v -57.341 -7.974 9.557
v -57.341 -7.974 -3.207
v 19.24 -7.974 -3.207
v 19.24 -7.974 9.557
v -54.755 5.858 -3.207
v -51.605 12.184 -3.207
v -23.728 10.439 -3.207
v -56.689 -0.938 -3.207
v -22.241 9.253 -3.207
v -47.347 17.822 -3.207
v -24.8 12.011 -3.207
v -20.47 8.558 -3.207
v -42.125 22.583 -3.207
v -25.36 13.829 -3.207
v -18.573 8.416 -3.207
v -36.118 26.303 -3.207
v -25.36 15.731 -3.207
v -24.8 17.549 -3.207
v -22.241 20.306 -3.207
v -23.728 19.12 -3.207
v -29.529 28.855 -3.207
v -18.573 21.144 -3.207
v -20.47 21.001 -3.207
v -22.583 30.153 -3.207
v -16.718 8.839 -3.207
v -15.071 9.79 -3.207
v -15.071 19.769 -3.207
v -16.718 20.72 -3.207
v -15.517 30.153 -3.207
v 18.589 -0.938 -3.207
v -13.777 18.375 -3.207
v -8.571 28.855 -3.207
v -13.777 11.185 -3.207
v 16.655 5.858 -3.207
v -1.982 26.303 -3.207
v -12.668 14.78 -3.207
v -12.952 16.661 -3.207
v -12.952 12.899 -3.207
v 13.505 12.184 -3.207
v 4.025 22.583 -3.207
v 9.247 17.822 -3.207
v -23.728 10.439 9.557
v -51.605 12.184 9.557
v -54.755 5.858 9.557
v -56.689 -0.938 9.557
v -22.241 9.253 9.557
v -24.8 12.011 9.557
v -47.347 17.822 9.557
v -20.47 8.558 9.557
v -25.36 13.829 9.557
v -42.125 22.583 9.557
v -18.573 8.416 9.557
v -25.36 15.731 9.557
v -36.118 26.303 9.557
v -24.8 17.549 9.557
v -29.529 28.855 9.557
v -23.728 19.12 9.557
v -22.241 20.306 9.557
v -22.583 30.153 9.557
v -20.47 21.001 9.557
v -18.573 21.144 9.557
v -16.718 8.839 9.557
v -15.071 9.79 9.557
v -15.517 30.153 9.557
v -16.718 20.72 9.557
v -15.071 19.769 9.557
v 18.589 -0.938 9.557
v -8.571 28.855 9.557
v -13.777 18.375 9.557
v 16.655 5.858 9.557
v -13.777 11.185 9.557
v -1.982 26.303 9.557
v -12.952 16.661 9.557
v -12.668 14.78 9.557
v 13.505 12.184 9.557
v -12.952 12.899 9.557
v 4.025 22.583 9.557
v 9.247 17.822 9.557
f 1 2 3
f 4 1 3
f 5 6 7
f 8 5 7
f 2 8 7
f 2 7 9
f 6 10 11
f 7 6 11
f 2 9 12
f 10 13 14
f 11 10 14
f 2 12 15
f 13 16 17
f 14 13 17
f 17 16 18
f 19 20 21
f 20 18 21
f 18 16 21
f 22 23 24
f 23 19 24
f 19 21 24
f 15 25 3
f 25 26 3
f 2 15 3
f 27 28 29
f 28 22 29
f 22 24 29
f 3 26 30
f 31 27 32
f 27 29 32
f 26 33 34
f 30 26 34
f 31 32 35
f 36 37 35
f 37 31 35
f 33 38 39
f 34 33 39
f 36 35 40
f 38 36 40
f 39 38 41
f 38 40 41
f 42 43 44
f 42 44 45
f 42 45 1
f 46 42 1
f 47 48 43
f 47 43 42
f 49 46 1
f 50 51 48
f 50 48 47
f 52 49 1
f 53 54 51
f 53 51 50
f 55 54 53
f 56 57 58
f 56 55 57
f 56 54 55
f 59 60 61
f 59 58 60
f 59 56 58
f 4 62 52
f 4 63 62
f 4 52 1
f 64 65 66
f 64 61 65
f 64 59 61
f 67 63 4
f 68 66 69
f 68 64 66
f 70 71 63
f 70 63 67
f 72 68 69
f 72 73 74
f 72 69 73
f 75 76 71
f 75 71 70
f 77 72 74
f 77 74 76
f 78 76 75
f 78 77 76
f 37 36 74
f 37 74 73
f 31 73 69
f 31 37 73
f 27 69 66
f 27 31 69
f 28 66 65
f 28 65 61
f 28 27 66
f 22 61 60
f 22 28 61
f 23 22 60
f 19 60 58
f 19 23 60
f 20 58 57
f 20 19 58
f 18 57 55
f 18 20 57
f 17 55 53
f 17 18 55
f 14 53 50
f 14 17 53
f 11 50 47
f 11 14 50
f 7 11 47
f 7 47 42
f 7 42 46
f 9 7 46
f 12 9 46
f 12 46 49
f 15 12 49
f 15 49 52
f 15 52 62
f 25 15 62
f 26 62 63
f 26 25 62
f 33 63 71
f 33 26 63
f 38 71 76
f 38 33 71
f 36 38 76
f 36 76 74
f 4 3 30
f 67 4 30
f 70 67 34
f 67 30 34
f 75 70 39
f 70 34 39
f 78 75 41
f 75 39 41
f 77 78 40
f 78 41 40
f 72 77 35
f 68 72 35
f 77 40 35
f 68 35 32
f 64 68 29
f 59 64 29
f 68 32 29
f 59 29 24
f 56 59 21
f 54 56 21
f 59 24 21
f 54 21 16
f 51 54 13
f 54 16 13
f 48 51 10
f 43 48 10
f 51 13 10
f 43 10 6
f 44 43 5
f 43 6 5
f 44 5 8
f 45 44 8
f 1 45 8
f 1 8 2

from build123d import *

# Parameters (mm, degrees)
SKETCH2_R           = 3.175
BOSS_EXTRUDE1_DEPTH = 6.35
SCALE1_SCALE        = 1.5
SCALE2_SCALE        = 0.67
SCALE3_SCALE        = 2


with BuildPart() as part:
    # Sketch2 → Boss-Extrude1 (new body)
    with BuildSketch(Plane.XY):
        with BuildLine():
            Line((-38.1, 0), (0, 0))
            ThreePointArc((0, 0), (-19.05, 19.05), (-38.1, 0))
        make_face()
        with Locations((-19.05, 11.320090227)):
            Circle(SKETCH2_R, mode=Mode.SUBTRACT)
    extrude(amount=BOSS_EXTRUDE1_DEPTH)


with BuildPart() as part_1:
    # Scale1: scaled about (-19.05, 7.894775867, 3.175)
    add(part.part.scale(SCALE1_SCALE).moved(Location((9.525, -3.947387933, -1.5875))))


with BuildPart() as part_2:
    # Scale2: scaled about (-19.05, 7.894775867, 3.175)
    add(part_1.part.scale(SCALE2_SCALE).moved(Location((-6.2865, 2.605276036, 1.04775))))


with BuildPart() as part_3:
    # Scale3: scaled about (-19.05, 7.894775867, 3.175)
    add(part_2.part.scale(SCALE3_SCALE).moved(Location((19.05, -7.894775867, -3.175))))


solid = part_3.part
